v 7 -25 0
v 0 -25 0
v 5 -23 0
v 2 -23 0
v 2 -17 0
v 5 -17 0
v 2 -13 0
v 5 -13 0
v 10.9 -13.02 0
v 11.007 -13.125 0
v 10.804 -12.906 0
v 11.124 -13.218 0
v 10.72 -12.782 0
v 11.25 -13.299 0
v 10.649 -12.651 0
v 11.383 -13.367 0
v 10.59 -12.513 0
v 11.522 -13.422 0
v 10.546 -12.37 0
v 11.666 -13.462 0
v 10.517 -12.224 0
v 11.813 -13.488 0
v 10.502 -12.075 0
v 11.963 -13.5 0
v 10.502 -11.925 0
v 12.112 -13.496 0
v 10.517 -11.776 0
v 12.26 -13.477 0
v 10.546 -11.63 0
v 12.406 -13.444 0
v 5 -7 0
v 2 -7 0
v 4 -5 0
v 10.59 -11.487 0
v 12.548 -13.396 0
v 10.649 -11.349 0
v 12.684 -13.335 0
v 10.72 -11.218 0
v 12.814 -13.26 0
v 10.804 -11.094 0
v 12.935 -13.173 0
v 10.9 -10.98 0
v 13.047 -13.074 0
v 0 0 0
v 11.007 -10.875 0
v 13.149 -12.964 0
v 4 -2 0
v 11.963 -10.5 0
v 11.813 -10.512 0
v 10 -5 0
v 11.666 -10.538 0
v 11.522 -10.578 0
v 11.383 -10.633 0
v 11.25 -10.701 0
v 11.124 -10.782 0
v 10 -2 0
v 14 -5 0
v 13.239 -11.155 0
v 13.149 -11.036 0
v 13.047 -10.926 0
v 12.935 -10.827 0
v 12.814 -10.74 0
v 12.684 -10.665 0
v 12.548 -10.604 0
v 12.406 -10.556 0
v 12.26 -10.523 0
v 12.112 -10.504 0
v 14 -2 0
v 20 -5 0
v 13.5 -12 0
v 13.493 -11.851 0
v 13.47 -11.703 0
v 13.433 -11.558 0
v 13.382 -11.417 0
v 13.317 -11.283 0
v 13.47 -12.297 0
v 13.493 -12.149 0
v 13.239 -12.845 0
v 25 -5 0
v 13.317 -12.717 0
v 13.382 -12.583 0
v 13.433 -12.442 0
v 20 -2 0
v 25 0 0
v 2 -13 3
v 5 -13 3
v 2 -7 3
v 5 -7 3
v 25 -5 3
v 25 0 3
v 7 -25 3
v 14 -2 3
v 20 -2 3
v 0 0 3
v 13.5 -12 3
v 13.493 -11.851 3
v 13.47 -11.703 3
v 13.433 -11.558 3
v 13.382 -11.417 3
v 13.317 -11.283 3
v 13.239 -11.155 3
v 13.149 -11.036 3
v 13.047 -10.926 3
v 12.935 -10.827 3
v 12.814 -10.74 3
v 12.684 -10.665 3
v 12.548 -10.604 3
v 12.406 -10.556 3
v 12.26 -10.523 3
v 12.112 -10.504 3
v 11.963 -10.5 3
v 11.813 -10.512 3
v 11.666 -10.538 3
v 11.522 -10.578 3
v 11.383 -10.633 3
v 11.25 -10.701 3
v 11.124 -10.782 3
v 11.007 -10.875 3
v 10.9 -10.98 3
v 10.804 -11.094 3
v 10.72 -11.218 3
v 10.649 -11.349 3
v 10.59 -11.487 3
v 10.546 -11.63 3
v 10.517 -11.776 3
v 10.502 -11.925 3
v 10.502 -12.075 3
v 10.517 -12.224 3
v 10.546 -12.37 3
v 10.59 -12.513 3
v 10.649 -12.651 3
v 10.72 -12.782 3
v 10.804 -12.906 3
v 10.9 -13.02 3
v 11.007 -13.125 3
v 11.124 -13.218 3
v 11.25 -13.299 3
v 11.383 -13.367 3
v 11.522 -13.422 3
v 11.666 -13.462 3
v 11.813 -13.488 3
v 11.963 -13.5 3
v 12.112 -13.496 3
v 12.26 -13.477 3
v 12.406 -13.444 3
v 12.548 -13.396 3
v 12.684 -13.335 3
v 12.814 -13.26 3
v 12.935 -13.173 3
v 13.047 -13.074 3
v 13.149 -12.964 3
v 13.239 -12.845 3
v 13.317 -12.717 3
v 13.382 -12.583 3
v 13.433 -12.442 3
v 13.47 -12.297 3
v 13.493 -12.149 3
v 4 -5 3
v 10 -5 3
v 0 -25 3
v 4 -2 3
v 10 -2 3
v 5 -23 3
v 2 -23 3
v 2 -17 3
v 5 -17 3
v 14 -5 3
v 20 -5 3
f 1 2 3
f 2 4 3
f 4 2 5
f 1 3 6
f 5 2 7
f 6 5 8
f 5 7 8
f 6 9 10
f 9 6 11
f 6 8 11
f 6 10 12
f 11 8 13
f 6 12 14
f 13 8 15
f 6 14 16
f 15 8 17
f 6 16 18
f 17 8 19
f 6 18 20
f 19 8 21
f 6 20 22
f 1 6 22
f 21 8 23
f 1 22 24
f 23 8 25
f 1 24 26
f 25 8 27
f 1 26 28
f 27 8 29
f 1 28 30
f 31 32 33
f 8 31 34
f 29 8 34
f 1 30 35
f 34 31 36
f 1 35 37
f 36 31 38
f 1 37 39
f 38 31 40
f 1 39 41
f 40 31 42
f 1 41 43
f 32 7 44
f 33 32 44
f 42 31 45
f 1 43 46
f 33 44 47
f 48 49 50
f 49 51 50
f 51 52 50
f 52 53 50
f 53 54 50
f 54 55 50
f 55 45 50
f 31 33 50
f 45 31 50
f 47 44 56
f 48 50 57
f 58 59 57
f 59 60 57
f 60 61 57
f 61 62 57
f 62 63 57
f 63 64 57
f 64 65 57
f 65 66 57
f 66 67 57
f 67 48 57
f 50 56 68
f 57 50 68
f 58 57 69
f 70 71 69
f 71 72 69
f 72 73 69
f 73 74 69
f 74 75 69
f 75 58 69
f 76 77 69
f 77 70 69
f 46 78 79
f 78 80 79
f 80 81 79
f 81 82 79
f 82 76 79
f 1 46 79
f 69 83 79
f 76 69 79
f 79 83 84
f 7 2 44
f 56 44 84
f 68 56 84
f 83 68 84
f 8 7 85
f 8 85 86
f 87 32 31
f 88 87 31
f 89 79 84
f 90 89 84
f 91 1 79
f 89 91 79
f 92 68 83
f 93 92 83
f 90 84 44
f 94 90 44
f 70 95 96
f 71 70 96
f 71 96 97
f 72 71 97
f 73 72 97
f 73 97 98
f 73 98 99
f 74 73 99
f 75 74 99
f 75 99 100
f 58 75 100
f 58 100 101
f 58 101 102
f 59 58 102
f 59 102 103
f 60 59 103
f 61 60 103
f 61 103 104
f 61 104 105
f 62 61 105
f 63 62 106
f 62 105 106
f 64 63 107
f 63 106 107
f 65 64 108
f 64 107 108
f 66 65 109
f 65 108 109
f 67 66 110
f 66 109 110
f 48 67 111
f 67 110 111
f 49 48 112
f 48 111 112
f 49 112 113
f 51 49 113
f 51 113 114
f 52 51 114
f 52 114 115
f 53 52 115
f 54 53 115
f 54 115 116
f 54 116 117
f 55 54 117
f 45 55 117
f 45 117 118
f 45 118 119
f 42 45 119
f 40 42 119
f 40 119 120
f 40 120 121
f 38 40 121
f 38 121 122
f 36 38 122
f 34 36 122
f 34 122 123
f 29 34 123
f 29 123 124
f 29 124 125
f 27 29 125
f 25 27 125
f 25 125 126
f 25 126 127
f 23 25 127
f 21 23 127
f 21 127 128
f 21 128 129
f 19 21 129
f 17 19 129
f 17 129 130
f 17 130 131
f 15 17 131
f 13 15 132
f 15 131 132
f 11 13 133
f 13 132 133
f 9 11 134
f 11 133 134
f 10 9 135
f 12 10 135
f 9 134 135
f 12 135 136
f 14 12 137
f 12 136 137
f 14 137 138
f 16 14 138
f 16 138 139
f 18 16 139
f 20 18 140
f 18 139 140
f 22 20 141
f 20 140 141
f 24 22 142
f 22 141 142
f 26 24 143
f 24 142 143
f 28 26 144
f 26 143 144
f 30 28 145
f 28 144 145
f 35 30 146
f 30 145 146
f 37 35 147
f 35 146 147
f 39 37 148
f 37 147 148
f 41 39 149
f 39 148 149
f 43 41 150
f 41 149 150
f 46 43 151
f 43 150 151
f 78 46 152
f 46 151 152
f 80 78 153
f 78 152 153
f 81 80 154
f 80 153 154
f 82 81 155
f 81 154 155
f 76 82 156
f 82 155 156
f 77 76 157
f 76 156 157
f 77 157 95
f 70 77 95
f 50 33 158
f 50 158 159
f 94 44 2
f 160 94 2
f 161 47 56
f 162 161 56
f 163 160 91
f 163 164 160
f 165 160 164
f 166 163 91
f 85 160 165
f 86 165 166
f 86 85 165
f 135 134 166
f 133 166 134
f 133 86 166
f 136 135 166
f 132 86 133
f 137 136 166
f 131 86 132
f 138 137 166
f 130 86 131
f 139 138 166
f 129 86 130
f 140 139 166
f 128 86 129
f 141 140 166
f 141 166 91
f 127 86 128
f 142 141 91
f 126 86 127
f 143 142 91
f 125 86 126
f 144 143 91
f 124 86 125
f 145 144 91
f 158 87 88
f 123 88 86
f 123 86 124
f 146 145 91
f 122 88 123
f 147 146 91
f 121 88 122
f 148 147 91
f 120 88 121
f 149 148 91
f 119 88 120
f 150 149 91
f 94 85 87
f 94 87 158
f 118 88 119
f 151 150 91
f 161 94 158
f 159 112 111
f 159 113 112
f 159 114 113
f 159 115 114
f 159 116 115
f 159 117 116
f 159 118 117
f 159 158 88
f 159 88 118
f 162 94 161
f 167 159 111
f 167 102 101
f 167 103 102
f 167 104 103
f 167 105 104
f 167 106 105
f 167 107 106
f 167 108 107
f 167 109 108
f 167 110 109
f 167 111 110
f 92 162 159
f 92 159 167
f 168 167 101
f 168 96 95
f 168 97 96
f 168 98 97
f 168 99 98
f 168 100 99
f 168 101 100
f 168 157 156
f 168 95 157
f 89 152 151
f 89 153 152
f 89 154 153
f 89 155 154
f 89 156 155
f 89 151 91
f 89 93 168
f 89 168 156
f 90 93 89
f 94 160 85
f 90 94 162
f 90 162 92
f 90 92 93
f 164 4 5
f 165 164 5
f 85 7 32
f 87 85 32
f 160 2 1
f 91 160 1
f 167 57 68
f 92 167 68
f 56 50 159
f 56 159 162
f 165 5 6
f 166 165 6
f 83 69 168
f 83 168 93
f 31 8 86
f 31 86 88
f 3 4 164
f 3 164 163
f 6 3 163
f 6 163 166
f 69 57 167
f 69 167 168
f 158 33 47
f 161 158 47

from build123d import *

# Parameters (mm, degrees)
SKETCH_1_W          = 3
SKETCH_1_H          = 6
SKETCH_1_W_2        = 6
SKETCH_1_H_2        = 3
EXTRUDE_1_DEPTH     = 3
SKETCH_2_R          = 1.5
CUT_EXTRUDE_1_DEPTH = 10


with BuildPart() as part:
    # 草图1 → 凸台-拉伸1 (new body)
    with BuildSketch(Plane.XY):
        Polygon((0, 0), (0, -2), (0, -5), (0, -25), (7, -25), (25, -5), (25, 0), align=None)
        with Locations((3.5, -10)):
            Rectangle(SKETCH_1_W, SKETCH_1_H, mode=Mode.SUBTRACT)
        with Locations((3.5, -20)):
            Rectangle(SKETCH_1_W, SKETCH_1_H, mode=Mode.SUBTRACT)
        with Locations((17, -3.5)):
            Rectangle(SKETCH_1_W_2, SKETCH_1_H_2, mode=Mode.SUBTRACT)
        with Locations((7, -3.5)):
            Rectangle(SKETCH_1_W_2, SKETCH_1_H_2, mode=Mode.SUBTRACT)
    extrude(amount=EXTRUDE_1_DEPTH)

    # 草图2 → 切除-拉伸1 (cut)
    with BuildSketch(Plane.XY.offset(3)):
        with Locations((12, -12)):
            Circle(SKETCH_2_R)
    extrude(amount=-CUT_EXTRUDE_1_DEPTH, mode=Mode.SUBTRACT)


solid = part.part
